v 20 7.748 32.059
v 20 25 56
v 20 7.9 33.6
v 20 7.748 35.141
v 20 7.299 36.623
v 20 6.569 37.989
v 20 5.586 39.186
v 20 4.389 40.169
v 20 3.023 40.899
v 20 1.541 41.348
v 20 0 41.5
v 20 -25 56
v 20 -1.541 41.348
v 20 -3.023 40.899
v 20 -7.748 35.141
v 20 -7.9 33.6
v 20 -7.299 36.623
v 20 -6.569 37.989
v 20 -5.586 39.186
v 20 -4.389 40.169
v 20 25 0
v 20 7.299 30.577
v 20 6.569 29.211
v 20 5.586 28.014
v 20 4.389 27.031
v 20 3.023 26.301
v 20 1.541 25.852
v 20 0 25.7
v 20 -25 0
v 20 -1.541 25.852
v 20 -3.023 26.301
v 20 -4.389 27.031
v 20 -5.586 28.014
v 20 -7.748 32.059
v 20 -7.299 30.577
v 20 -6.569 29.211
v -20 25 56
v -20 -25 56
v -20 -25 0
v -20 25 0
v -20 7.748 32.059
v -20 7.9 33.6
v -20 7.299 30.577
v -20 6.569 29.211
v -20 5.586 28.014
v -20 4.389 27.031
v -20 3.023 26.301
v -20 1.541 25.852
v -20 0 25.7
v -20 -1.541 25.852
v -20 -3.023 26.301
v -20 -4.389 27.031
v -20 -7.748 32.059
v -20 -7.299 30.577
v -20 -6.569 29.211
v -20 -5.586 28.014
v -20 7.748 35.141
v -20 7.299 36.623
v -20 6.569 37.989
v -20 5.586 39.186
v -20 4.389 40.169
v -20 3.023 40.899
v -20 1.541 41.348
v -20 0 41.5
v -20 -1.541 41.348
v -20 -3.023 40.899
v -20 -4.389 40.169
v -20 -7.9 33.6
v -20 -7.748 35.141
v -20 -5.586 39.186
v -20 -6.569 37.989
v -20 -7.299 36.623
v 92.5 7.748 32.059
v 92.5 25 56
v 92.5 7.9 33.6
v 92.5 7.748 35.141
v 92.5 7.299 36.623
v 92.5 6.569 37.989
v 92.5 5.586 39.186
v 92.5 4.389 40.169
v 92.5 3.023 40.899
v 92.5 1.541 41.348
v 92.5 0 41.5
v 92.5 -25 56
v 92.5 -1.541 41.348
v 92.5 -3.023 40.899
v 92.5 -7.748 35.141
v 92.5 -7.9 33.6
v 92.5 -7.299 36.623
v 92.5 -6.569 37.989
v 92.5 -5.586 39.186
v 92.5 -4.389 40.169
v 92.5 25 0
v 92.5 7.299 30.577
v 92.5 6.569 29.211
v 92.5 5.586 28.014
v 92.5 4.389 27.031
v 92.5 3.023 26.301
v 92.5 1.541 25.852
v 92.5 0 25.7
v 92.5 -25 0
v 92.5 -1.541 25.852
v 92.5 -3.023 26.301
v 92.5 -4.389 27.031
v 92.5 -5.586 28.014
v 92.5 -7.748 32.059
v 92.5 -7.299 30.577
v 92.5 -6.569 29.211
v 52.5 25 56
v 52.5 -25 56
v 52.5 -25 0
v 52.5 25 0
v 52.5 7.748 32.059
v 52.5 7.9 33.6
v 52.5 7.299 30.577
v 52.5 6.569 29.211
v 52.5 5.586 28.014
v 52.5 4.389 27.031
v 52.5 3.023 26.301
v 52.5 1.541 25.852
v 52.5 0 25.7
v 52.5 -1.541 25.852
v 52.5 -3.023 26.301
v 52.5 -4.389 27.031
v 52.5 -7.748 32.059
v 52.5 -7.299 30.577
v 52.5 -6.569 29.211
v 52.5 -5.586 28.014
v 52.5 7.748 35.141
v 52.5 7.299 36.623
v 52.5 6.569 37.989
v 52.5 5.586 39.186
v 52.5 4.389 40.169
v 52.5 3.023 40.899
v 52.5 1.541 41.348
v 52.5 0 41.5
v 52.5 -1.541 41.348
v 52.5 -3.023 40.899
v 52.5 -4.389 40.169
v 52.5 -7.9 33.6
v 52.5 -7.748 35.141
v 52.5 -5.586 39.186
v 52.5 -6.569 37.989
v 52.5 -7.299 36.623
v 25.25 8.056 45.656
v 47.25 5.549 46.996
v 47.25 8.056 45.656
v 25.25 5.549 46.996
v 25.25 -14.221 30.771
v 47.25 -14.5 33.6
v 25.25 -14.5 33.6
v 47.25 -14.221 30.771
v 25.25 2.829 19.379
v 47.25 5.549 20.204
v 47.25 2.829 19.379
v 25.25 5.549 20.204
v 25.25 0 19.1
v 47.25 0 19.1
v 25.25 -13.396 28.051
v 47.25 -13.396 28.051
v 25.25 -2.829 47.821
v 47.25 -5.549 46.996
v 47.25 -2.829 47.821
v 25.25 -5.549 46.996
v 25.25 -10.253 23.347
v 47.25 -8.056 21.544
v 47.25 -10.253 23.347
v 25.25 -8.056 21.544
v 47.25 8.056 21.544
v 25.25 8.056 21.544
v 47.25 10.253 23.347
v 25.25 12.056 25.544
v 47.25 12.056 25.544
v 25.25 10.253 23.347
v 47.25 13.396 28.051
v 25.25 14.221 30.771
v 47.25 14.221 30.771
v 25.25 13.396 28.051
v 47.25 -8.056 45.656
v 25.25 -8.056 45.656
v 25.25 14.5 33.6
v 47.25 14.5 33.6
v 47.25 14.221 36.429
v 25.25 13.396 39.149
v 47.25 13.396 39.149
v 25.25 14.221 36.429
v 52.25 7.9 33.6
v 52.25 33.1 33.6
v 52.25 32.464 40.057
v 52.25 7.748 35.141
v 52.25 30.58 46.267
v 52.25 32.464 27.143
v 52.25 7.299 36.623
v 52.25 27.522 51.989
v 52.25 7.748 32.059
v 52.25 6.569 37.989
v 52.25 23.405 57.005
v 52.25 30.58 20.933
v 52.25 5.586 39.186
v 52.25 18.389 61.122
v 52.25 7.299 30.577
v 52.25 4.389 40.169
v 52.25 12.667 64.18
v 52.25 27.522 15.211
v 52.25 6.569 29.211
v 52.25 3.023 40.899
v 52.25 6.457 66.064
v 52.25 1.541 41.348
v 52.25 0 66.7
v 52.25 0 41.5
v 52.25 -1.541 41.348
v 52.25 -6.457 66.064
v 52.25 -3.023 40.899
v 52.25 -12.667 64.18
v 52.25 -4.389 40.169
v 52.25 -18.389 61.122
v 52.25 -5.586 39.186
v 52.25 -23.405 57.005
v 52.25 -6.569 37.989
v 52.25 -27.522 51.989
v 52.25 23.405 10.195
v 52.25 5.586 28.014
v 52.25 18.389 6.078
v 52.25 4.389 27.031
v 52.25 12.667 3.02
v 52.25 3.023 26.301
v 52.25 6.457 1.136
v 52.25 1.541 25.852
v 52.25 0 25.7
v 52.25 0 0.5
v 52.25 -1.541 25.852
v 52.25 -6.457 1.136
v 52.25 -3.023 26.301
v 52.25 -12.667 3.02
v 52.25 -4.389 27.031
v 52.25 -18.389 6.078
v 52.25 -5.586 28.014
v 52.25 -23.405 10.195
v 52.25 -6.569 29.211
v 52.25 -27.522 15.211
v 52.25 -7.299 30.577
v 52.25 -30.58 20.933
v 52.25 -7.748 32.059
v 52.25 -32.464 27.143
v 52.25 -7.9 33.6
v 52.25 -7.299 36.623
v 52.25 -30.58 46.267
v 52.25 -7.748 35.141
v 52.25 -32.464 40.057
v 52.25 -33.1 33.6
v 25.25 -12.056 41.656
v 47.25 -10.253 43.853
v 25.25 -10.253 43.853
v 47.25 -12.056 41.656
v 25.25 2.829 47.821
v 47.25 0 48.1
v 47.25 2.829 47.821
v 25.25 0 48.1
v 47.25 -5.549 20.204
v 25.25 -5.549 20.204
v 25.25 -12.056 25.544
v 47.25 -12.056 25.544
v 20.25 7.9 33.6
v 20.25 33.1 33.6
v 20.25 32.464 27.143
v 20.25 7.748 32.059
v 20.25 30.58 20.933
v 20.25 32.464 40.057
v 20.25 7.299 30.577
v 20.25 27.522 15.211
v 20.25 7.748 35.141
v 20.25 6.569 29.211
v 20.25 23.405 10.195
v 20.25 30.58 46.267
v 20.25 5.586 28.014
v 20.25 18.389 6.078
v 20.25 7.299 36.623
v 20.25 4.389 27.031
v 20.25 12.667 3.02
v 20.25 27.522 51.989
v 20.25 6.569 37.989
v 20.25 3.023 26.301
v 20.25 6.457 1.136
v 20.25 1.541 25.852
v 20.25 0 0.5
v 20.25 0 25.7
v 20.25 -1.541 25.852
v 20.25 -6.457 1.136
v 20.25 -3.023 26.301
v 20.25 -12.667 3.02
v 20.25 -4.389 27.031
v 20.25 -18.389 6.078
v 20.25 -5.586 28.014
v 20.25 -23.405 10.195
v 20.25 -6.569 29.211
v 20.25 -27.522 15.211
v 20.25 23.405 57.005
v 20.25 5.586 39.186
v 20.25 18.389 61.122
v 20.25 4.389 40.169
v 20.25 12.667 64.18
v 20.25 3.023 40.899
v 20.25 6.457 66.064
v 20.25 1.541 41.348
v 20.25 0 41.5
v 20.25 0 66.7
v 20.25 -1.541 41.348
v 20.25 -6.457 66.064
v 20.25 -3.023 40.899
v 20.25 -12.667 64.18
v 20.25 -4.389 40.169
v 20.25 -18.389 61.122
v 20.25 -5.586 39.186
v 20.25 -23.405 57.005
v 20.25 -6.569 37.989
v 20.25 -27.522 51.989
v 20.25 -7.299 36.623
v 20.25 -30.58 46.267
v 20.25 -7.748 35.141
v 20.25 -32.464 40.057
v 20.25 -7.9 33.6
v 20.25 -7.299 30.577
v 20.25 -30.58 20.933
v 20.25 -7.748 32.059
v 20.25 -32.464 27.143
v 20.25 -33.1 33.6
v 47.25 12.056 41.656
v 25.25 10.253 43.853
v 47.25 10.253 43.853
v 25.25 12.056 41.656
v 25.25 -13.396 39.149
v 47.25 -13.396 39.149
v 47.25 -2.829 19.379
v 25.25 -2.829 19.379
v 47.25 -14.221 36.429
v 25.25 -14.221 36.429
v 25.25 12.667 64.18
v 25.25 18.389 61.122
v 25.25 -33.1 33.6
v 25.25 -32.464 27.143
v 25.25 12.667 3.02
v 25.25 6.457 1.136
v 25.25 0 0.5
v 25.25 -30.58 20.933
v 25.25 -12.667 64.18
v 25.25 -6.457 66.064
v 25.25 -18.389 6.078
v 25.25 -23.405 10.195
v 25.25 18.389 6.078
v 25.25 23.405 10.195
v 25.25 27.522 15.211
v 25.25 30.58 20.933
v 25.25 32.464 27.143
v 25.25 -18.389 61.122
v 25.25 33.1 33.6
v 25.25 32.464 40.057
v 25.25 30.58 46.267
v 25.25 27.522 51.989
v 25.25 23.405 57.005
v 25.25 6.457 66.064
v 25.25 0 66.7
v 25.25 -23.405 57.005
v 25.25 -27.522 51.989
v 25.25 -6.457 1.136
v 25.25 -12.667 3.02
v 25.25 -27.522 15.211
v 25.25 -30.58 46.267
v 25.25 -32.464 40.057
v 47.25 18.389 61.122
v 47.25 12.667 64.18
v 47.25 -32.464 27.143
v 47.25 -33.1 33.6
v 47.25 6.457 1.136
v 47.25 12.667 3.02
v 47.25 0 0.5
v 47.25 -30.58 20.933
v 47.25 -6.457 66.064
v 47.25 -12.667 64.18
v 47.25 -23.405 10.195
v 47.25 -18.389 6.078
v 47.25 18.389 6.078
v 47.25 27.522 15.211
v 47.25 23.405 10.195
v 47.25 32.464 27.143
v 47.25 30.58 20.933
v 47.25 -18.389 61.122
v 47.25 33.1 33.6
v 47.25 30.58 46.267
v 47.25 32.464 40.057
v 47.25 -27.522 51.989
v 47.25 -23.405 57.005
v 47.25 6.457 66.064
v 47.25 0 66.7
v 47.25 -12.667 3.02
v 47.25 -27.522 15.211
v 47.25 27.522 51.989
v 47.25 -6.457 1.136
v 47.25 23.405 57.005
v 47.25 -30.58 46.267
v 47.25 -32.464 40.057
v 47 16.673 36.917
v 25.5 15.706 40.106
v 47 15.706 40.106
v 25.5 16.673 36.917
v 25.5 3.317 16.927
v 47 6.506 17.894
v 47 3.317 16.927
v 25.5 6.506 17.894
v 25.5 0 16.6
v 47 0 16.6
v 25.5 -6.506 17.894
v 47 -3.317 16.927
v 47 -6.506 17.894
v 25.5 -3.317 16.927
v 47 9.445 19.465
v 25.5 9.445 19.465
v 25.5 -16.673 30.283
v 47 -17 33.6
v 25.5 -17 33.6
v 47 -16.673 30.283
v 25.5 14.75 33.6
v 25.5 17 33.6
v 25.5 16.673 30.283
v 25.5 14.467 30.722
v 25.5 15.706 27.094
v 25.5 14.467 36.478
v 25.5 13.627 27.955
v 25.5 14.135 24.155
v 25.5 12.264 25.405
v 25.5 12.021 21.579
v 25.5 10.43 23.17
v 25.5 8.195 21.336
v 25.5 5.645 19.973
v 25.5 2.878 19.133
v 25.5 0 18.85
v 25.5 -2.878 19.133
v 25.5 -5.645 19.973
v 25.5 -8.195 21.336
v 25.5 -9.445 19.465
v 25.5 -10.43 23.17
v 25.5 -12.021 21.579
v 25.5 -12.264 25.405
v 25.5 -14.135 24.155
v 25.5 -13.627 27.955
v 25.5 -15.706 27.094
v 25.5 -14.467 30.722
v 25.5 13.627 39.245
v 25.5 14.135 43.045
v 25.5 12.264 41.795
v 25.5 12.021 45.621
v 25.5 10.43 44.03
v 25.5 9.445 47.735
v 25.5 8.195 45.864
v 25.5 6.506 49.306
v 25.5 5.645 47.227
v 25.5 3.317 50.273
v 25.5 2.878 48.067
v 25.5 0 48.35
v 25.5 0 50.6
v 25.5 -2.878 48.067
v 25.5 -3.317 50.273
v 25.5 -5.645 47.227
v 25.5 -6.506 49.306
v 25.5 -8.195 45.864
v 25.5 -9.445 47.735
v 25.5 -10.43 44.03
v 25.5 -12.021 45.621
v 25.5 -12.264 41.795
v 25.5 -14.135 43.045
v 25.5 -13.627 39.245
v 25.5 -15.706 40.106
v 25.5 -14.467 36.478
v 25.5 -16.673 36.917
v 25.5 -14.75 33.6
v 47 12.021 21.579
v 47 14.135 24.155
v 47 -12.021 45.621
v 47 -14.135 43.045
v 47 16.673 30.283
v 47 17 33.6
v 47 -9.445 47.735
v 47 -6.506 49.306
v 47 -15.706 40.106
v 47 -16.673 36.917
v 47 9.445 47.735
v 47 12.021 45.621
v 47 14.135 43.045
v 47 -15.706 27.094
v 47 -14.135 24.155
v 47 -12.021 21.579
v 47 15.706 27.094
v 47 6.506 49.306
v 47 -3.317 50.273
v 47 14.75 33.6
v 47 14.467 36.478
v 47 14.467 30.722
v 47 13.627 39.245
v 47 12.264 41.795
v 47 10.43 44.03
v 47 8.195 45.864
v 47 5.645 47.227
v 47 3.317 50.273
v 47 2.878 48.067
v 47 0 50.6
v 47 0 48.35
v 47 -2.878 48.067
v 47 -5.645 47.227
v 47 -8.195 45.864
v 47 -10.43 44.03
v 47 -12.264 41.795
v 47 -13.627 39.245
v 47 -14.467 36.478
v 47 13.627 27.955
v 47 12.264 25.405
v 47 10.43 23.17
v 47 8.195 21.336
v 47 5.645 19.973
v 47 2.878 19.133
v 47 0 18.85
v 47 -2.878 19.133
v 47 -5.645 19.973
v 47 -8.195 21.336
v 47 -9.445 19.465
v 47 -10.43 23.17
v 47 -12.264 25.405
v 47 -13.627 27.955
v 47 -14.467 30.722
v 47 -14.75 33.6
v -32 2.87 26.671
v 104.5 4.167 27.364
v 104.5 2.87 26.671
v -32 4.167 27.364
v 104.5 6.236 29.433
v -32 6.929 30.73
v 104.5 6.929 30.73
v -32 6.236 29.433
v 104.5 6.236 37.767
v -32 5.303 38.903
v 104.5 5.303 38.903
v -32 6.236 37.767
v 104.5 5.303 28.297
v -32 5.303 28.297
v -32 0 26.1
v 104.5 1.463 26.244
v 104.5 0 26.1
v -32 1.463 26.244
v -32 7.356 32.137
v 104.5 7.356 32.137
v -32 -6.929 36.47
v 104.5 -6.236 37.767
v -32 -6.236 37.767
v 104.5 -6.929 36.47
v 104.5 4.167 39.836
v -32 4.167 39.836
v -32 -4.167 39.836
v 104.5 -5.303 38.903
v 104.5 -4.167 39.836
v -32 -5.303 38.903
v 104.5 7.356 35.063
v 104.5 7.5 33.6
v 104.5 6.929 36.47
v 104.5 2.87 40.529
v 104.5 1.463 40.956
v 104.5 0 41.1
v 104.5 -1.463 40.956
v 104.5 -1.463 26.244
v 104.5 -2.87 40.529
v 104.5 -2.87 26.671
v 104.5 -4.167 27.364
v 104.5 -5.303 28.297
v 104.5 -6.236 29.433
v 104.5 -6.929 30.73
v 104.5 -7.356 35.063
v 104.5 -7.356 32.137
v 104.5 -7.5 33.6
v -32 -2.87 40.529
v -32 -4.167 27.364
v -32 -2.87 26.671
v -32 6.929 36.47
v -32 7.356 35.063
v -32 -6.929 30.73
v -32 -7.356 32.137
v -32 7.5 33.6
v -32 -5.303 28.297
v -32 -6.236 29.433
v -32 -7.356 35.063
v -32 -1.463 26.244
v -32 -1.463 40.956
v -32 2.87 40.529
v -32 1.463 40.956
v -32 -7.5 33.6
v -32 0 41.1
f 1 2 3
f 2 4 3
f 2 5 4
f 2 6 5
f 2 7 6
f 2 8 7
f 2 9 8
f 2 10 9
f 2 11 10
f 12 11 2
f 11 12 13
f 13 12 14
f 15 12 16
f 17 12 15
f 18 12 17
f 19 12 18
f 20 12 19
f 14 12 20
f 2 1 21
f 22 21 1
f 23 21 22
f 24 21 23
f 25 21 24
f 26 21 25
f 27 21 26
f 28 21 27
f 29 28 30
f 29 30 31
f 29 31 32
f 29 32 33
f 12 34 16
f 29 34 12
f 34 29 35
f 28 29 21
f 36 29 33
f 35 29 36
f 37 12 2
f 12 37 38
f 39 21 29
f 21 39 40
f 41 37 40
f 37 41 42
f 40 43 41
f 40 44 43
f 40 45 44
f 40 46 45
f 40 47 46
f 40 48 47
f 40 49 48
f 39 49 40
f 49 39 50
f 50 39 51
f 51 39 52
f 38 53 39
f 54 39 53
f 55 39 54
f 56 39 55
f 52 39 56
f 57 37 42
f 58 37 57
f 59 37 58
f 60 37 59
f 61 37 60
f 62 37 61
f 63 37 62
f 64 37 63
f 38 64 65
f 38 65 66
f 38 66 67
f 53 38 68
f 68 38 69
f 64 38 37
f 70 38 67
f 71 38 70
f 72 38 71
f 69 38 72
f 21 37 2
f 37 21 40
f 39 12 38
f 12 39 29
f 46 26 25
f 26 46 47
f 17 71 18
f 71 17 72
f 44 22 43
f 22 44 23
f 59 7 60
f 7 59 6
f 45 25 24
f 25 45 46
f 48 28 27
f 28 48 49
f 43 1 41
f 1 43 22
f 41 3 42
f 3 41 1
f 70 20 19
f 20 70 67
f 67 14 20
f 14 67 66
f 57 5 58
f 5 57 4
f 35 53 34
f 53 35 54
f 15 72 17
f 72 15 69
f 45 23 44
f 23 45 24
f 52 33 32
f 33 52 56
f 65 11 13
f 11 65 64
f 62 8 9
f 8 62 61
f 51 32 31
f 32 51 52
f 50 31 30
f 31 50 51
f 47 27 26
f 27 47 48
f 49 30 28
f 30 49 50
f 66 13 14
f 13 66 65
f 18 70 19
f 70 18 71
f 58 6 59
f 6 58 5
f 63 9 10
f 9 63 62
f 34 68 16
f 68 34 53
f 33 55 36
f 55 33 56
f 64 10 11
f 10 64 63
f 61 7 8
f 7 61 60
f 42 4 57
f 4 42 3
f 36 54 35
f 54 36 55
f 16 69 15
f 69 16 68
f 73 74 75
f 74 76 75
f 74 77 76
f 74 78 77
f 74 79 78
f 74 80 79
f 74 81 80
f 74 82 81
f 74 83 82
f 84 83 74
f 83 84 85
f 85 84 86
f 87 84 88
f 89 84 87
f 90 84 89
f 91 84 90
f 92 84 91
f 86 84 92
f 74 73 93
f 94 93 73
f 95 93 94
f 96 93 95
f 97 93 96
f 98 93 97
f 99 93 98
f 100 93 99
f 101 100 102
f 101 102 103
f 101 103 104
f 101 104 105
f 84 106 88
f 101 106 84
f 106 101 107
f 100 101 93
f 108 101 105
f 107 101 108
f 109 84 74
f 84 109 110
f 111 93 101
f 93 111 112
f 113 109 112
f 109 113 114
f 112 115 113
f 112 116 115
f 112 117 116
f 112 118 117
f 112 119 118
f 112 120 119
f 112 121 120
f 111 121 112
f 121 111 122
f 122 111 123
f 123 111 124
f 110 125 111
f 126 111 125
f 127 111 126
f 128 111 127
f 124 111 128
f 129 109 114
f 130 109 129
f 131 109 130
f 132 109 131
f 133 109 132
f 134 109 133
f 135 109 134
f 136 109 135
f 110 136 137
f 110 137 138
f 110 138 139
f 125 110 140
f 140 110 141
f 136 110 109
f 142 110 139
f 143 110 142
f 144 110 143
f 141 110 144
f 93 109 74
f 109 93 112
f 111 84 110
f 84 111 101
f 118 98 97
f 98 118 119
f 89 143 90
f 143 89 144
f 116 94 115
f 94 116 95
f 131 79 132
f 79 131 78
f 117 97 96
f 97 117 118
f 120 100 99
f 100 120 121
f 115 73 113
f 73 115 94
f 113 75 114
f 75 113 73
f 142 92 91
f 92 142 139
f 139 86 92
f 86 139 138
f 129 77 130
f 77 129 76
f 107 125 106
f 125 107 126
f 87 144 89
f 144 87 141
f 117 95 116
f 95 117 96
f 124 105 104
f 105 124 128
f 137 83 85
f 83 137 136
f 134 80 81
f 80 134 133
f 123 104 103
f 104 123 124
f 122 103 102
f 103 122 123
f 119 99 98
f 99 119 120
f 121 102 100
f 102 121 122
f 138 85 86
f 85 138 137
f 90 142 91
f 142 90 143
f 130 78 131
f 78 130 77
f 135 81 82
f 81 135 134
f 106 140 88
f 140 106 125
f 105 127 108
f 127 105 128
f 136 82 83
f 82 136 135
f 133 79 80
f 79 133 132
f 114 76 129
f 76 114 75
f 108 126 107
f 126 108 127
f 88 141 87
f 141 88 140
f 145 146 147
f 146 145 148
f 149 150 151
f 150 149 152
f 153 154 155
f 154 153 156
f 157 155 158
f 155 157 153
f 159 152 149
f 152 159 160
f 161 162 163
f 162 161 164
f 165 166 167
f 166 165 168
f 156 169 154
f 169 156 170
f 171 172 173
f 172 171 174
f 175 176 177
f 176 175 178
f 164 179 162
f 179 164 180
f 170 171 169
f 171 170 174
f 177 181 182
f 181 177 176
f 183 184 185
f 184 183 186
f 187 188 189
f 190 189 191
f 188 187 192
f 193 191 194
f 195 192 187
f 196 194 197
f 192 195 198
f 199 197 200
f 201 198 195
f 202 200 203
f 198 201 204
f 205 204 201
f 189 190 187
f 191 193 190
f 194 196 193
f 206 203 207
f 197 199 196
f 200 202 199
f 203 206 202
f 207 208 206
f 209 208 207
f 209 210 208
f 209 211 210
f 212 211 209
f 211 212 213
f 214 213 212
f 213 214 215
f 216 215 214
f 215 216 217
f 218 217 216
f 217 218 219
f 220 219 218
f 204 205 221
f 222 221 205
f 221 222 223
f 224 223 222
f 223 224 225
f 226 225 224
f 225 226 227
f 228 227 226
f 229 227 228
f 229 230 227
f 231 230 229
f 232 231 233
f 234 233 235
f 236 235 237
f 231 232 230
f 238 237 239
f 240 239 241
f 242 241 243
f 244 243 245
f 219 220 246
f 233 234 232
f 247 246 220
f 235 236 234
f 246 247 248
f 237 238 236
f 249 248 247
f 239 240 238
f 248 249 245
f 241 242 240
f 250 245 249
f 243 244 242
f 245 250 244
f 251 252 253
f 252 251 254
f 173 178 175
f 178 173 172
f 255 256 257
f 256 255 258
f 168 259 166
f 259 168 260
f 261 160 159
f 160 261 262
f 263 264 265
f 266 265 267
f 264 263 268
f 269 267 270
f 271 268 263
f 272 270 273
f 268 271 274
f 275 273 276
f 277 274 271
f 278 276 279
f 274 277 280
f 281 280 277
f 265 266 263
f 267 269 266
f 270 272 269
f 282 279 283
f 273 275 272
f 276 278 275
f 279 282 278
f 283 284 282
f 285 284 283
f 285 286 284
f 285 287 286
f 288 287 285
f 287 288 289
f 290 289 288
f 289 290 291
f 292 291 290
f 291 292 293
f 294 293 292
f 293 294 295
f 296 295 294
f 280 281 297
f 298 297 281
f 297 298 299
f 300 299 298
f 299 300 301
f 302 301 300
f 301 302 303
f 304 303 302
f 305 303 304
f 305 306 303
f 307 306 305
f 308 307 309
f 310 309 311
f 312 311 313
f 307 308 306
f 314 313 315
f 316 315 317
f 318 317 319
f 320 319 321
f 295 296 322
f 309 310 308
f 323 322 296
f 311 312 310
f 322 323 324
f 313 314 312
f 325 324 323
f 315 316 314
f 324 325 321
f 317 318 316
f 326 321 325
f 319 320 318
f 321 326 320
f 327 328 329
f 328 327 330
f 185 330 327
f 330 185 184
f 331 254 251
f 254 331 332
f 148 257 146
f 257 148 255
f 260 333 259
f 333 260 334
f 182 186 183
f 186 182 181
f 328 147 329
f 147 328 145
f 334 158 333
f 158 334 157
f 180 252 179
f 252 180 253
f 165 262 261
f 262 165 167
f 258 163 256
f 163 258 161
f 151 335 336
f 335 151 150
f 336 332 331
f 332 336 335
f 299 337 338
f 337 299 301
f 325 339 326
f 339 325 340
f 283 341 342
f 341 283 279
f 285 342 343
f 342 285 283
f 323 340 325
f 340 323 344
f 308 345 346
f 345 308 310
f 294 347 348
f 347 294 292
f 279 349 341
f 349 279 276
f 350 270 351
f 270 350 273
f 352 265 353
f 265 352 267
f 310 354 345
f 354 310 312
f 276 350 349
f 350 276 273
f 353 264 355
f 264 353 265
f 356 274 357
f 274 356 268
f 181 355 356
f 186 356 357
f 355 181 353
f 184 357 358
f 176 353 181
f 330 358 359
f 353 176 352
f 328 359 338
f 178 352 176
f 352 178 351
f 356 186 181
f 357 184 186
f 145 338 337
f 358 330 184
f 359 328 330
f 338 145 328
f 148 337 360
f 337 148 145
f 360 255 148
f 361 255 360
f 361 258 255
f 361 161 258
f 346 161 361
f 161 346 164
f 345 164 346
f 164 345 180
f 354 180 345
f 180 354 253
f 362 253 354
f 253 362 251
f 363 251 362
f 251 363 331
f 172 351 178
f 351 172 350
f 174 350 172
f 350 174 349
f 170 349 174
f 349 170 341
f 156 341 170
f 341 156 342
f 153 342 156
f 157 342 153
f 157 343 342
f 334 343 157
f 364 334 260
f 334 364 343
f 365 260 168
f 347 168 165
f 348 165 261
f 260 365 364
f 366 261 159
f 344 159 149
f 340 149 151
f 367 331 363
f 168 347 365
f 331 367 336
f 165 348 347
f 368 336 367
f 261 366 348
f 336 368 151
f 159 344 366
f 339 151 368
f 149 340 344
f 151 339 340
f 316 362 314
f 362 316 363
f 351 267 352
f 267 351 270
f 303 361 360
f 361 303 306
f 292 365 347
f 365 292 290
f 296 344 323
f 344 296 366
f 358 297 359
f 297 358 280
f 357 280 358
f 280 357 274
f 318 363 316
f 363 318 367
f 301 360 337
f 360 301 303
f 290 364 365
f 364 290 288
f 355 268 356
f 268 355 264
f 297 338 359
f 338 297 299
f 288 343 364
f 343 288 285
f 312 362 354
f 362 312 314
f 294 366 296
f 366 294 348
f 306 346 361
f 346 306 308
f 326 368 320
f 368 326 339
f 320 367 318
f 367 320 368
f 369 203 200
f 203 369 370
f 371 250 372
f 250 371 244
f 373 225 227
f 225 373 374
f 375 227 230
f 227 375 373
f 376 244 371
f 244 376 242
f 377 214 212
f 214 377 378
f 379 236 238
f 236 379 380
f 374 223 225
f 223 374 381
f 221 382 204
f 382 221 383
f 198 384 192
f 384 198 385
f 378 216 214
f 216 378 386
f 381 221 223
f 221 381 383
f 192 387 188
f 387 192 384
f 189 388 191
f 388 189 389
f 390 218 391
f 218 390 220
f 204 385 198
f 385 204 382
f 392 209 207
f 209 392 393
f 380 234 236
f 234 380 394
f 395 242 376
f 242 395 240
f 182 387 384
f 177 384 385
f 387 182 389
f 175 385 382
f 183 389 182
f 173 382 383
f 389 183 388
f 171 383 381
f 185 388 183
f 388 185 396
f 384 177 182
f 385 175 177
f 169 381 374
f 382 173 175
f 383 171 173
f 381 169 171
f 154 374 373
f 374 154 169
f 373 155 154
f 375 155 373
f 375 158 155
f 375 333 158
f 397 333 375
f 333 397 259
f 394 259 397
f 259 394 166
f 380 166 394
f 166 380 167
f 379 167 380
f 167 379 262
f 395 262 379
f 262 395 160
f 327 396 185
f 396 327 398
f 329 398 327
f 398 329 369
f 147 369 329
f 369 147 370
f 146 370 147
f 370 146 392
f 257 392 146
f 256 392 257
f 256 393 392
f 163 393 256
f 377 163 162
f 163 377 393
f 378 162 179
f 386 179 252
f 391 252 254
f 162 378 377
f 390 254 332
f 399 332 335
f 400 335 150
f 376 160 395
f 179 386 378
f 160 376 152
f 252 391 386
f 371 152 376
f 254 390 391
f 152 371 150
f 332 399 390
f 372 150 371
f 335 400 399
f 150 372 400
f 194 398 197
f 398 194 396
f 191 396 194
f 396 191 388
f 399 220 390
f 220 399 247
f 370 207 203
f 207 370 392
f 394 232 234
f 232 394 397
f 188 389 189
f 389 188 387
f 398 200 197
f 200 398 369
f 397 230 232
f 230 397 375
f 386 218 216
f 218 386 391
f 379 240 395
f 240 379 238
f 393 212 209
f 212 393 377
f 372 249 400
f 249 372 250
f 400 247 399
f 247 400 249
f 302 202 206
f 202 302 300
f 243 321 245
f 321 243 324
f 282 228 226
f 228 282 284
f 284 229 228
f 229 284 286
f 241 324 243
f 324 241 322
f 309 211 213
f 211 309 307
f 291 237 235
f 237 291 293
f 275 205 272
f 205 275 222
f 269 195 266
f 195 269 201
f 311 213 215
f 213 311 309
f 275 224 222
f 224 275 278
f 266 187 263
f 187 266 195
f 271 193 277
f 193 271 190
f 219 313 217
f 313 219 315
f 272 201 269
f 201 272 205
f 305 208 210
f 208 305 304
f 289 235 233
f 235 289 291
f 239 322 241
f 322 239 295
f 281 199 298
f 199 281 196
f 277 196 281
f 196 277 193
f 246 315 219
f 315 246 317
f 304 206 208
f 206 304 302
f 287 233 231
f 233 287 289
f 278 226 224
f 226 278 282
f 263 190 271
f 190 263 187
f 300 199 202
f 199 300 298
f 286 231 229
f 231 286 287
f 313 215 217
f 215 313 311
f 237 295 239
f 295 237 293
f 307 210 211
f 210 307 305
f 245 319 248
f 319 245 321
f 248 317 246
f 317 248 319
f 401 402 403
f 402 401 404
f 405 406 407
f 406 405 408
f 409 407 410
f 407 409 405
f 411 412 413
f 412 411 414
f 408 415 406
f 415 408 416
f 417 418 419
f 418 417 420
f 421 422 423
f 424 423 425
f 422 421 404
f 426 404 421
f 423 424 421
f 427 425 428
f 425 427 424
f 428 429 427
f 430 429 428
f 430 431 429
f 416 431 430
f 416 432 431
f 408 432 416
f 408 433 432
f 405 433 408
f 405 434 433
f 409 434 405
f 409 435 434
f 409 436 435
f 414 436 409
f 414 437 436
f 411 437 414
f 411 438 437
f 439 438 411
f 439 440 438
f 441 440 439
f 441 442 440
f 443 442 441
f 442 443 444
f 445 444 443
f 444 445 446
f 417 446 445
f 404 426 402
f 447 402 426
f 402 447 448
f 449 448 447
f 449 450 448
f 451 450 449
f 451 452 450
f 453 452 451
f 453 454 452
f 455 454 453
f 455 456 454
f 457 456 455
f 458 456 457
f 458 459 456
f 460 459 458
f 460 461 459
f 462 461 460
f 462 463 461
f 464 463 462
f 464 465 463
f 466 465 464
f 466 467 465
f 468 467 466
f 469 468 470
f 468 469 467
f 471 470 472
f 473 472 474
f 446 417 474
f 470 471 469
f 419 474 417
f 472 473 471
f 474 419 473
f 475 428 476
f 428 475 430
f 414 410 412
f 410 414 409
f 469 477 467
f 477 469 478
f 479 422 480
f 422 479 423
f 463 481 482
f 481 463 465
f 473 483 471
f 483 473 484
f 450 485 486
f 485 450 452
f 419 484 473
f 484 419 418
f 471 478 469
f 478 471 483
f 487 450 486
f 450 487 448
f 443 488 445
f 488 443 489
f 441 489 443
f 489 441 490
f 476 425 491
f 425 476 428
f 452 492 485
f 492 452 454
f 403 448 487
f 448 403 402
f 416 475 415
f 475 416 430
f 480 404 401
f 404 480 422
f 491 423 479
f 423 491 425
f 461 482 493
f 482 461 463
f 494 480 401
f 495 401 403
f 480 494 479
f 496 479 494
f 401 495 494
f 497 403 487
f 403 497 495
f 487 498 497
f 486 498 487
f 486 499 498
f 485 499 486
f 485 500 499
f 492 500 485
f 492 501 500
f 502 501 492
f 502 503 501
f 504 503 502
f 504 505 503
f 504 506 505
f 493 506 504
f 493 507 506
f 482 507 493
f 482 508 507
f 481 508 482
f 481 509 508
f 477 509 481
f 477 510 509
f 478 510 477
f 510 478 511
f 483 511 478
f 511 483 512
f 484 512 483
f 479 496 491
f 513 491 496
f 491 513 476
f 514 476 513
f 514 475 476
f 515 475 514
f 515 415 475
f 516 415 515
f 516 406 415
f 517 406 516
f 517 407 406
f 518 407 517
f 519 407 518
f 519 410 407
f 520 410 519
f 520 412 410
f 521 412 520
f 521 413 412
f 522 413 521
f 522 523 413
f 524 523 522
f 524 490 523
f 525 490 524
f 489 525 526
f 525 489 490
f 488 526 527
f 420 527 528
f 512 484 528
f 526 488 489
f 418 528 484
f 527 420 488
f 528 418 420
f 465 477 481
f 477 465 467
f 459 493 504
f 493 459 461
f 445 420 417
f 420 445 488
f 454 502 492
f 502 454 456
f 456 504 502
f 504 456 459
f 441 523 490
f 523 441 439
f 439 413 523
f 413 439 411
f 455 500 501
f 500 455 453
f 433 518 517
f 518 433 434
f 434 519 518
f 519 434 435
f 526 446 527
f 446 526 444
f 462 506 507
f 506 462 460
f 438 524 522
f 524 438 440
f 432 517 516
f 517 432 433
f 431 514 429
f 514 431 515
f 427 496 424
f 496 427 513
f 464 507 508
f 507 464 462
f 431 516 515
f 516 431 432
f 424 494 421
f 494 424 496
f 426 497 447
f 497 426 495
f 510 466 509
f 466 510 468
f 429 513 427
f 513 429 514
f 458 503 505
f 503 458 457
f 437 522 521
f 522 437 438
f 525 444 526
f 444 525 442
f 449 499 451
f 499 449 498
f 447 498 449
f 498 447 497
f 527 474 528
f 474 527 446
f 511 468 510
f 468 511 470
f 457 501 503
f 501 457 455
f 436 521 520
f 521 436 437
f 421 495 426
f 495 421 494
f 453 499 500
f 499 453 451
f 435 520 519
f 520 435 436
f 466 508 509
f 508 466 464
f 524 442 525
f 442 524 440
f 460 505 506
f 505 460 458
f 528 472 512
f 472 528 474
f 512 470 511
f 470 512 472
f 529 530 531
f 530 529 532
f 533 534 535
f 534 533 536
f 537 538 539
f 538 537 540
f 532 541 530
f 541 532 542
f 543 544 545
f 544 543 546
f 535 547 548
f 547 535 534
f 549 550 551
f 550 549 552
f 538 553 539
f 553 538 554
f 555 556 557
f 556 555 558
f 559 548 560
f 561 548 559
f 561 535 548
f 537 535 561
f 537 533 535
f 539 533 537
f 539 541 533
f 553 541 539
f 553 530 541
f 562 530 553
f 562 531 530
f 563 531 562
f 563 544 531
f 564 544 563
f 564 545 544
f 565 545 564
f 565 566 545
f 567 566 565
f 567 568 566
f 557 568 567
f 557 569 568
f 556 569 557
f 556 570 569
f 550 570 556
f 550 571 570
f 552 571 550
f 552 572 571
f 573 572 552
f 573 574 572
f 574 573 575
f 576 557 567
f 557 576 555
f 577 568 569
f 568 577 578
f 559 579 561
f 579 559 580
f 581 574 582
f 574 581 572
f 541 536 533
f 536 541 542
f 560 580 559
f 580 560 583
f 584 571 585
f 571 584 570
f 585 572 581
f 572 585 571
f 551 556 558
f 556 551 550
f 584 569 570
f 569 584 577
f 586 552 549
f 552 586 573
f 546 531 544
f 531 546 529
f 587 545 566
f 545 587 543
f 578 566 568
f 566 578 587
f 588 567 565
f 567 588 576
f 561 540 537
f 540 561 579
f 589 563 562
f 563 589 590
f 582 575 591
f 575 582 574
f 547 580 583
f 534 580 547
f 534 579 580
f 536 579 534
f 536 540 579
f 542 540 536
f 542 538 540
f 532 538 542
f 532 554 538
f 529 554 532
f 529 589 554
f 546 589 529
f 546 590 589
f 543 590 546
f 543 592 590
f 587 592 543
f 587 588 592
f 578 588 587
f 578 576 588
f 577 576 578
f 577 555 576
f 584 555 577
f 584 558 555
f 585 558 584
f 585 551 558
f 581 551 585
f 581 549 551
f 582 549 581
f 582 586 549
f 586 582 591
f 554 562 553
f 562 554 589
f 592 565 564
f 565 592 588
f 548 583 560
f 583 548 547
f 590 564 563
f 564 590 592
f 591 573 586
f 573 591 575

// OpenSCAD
$fn = 32;

// ------------------------------------------------------------------------
// Pulley assembly: d66.2 pulley with a belt, shaft d15
// Every part is its own module, assembly() places them once.
// ------------------------------------------------------------------------

// --- part 1 ---
module support1() {
  difference() {
    translate([-20, -25, 0]) cube([40, 50, 56]);
    translate([0, 0, 33.6]) rotate([0, 90, 0]) cylinder(h = 42, d = 15.8, center = true);
  }
}

// --- part 2 ---
module support2() {
  difference() {
    translate([-20, -25, 0]) cube([40, 50, 56]);
    translate([0, 0, 33.6]) rotate([0, 90, 0]) cylinder(h = 42, d = 15.8, center = true);
  }
}

// --- part 3 ---
module shaft() {
  translate([0, 0, -68.25]) cylinder(h = 136.5, d = 15);
}

// --- part 4 ---
module pulley() {
  difference() {
    union() {
      cylinder(h = 32, d = 29);
      cylinder(h = 5, d = 66.2);
      translate([0, 0, 27]) cylinder(h = 5, d = 66.2);
    }
    translate([0, 0, -1]) cylinder(h = 34, d = 15.8);
  }
}

// --- part 5 ---
module belt() {
  difference() {
      translate([0, 0, 0]) cylinder(h = 21.5, d = 34);
      translate([0, 0, -1]) cylinder(h = 23.5, d = 29.5);
    }
}

// --- assembly ---
module assembly() {
  translate([0, 0, 0]) rotate([0, 0, 0]) support1();
  translate([72.5, 0, 0]) rotate([0, 0, 0]) support2();
  translate([36.25, 0, 33.6]) rotate([0, 90, 0]) shaft();
  translate([20.25, 0, 33.6]) rotate([0, 90, 0]) pulley();
  translate([25.5, 0, 33.6]) rotate([0, 90, 0]) belt();
}

assembly();
